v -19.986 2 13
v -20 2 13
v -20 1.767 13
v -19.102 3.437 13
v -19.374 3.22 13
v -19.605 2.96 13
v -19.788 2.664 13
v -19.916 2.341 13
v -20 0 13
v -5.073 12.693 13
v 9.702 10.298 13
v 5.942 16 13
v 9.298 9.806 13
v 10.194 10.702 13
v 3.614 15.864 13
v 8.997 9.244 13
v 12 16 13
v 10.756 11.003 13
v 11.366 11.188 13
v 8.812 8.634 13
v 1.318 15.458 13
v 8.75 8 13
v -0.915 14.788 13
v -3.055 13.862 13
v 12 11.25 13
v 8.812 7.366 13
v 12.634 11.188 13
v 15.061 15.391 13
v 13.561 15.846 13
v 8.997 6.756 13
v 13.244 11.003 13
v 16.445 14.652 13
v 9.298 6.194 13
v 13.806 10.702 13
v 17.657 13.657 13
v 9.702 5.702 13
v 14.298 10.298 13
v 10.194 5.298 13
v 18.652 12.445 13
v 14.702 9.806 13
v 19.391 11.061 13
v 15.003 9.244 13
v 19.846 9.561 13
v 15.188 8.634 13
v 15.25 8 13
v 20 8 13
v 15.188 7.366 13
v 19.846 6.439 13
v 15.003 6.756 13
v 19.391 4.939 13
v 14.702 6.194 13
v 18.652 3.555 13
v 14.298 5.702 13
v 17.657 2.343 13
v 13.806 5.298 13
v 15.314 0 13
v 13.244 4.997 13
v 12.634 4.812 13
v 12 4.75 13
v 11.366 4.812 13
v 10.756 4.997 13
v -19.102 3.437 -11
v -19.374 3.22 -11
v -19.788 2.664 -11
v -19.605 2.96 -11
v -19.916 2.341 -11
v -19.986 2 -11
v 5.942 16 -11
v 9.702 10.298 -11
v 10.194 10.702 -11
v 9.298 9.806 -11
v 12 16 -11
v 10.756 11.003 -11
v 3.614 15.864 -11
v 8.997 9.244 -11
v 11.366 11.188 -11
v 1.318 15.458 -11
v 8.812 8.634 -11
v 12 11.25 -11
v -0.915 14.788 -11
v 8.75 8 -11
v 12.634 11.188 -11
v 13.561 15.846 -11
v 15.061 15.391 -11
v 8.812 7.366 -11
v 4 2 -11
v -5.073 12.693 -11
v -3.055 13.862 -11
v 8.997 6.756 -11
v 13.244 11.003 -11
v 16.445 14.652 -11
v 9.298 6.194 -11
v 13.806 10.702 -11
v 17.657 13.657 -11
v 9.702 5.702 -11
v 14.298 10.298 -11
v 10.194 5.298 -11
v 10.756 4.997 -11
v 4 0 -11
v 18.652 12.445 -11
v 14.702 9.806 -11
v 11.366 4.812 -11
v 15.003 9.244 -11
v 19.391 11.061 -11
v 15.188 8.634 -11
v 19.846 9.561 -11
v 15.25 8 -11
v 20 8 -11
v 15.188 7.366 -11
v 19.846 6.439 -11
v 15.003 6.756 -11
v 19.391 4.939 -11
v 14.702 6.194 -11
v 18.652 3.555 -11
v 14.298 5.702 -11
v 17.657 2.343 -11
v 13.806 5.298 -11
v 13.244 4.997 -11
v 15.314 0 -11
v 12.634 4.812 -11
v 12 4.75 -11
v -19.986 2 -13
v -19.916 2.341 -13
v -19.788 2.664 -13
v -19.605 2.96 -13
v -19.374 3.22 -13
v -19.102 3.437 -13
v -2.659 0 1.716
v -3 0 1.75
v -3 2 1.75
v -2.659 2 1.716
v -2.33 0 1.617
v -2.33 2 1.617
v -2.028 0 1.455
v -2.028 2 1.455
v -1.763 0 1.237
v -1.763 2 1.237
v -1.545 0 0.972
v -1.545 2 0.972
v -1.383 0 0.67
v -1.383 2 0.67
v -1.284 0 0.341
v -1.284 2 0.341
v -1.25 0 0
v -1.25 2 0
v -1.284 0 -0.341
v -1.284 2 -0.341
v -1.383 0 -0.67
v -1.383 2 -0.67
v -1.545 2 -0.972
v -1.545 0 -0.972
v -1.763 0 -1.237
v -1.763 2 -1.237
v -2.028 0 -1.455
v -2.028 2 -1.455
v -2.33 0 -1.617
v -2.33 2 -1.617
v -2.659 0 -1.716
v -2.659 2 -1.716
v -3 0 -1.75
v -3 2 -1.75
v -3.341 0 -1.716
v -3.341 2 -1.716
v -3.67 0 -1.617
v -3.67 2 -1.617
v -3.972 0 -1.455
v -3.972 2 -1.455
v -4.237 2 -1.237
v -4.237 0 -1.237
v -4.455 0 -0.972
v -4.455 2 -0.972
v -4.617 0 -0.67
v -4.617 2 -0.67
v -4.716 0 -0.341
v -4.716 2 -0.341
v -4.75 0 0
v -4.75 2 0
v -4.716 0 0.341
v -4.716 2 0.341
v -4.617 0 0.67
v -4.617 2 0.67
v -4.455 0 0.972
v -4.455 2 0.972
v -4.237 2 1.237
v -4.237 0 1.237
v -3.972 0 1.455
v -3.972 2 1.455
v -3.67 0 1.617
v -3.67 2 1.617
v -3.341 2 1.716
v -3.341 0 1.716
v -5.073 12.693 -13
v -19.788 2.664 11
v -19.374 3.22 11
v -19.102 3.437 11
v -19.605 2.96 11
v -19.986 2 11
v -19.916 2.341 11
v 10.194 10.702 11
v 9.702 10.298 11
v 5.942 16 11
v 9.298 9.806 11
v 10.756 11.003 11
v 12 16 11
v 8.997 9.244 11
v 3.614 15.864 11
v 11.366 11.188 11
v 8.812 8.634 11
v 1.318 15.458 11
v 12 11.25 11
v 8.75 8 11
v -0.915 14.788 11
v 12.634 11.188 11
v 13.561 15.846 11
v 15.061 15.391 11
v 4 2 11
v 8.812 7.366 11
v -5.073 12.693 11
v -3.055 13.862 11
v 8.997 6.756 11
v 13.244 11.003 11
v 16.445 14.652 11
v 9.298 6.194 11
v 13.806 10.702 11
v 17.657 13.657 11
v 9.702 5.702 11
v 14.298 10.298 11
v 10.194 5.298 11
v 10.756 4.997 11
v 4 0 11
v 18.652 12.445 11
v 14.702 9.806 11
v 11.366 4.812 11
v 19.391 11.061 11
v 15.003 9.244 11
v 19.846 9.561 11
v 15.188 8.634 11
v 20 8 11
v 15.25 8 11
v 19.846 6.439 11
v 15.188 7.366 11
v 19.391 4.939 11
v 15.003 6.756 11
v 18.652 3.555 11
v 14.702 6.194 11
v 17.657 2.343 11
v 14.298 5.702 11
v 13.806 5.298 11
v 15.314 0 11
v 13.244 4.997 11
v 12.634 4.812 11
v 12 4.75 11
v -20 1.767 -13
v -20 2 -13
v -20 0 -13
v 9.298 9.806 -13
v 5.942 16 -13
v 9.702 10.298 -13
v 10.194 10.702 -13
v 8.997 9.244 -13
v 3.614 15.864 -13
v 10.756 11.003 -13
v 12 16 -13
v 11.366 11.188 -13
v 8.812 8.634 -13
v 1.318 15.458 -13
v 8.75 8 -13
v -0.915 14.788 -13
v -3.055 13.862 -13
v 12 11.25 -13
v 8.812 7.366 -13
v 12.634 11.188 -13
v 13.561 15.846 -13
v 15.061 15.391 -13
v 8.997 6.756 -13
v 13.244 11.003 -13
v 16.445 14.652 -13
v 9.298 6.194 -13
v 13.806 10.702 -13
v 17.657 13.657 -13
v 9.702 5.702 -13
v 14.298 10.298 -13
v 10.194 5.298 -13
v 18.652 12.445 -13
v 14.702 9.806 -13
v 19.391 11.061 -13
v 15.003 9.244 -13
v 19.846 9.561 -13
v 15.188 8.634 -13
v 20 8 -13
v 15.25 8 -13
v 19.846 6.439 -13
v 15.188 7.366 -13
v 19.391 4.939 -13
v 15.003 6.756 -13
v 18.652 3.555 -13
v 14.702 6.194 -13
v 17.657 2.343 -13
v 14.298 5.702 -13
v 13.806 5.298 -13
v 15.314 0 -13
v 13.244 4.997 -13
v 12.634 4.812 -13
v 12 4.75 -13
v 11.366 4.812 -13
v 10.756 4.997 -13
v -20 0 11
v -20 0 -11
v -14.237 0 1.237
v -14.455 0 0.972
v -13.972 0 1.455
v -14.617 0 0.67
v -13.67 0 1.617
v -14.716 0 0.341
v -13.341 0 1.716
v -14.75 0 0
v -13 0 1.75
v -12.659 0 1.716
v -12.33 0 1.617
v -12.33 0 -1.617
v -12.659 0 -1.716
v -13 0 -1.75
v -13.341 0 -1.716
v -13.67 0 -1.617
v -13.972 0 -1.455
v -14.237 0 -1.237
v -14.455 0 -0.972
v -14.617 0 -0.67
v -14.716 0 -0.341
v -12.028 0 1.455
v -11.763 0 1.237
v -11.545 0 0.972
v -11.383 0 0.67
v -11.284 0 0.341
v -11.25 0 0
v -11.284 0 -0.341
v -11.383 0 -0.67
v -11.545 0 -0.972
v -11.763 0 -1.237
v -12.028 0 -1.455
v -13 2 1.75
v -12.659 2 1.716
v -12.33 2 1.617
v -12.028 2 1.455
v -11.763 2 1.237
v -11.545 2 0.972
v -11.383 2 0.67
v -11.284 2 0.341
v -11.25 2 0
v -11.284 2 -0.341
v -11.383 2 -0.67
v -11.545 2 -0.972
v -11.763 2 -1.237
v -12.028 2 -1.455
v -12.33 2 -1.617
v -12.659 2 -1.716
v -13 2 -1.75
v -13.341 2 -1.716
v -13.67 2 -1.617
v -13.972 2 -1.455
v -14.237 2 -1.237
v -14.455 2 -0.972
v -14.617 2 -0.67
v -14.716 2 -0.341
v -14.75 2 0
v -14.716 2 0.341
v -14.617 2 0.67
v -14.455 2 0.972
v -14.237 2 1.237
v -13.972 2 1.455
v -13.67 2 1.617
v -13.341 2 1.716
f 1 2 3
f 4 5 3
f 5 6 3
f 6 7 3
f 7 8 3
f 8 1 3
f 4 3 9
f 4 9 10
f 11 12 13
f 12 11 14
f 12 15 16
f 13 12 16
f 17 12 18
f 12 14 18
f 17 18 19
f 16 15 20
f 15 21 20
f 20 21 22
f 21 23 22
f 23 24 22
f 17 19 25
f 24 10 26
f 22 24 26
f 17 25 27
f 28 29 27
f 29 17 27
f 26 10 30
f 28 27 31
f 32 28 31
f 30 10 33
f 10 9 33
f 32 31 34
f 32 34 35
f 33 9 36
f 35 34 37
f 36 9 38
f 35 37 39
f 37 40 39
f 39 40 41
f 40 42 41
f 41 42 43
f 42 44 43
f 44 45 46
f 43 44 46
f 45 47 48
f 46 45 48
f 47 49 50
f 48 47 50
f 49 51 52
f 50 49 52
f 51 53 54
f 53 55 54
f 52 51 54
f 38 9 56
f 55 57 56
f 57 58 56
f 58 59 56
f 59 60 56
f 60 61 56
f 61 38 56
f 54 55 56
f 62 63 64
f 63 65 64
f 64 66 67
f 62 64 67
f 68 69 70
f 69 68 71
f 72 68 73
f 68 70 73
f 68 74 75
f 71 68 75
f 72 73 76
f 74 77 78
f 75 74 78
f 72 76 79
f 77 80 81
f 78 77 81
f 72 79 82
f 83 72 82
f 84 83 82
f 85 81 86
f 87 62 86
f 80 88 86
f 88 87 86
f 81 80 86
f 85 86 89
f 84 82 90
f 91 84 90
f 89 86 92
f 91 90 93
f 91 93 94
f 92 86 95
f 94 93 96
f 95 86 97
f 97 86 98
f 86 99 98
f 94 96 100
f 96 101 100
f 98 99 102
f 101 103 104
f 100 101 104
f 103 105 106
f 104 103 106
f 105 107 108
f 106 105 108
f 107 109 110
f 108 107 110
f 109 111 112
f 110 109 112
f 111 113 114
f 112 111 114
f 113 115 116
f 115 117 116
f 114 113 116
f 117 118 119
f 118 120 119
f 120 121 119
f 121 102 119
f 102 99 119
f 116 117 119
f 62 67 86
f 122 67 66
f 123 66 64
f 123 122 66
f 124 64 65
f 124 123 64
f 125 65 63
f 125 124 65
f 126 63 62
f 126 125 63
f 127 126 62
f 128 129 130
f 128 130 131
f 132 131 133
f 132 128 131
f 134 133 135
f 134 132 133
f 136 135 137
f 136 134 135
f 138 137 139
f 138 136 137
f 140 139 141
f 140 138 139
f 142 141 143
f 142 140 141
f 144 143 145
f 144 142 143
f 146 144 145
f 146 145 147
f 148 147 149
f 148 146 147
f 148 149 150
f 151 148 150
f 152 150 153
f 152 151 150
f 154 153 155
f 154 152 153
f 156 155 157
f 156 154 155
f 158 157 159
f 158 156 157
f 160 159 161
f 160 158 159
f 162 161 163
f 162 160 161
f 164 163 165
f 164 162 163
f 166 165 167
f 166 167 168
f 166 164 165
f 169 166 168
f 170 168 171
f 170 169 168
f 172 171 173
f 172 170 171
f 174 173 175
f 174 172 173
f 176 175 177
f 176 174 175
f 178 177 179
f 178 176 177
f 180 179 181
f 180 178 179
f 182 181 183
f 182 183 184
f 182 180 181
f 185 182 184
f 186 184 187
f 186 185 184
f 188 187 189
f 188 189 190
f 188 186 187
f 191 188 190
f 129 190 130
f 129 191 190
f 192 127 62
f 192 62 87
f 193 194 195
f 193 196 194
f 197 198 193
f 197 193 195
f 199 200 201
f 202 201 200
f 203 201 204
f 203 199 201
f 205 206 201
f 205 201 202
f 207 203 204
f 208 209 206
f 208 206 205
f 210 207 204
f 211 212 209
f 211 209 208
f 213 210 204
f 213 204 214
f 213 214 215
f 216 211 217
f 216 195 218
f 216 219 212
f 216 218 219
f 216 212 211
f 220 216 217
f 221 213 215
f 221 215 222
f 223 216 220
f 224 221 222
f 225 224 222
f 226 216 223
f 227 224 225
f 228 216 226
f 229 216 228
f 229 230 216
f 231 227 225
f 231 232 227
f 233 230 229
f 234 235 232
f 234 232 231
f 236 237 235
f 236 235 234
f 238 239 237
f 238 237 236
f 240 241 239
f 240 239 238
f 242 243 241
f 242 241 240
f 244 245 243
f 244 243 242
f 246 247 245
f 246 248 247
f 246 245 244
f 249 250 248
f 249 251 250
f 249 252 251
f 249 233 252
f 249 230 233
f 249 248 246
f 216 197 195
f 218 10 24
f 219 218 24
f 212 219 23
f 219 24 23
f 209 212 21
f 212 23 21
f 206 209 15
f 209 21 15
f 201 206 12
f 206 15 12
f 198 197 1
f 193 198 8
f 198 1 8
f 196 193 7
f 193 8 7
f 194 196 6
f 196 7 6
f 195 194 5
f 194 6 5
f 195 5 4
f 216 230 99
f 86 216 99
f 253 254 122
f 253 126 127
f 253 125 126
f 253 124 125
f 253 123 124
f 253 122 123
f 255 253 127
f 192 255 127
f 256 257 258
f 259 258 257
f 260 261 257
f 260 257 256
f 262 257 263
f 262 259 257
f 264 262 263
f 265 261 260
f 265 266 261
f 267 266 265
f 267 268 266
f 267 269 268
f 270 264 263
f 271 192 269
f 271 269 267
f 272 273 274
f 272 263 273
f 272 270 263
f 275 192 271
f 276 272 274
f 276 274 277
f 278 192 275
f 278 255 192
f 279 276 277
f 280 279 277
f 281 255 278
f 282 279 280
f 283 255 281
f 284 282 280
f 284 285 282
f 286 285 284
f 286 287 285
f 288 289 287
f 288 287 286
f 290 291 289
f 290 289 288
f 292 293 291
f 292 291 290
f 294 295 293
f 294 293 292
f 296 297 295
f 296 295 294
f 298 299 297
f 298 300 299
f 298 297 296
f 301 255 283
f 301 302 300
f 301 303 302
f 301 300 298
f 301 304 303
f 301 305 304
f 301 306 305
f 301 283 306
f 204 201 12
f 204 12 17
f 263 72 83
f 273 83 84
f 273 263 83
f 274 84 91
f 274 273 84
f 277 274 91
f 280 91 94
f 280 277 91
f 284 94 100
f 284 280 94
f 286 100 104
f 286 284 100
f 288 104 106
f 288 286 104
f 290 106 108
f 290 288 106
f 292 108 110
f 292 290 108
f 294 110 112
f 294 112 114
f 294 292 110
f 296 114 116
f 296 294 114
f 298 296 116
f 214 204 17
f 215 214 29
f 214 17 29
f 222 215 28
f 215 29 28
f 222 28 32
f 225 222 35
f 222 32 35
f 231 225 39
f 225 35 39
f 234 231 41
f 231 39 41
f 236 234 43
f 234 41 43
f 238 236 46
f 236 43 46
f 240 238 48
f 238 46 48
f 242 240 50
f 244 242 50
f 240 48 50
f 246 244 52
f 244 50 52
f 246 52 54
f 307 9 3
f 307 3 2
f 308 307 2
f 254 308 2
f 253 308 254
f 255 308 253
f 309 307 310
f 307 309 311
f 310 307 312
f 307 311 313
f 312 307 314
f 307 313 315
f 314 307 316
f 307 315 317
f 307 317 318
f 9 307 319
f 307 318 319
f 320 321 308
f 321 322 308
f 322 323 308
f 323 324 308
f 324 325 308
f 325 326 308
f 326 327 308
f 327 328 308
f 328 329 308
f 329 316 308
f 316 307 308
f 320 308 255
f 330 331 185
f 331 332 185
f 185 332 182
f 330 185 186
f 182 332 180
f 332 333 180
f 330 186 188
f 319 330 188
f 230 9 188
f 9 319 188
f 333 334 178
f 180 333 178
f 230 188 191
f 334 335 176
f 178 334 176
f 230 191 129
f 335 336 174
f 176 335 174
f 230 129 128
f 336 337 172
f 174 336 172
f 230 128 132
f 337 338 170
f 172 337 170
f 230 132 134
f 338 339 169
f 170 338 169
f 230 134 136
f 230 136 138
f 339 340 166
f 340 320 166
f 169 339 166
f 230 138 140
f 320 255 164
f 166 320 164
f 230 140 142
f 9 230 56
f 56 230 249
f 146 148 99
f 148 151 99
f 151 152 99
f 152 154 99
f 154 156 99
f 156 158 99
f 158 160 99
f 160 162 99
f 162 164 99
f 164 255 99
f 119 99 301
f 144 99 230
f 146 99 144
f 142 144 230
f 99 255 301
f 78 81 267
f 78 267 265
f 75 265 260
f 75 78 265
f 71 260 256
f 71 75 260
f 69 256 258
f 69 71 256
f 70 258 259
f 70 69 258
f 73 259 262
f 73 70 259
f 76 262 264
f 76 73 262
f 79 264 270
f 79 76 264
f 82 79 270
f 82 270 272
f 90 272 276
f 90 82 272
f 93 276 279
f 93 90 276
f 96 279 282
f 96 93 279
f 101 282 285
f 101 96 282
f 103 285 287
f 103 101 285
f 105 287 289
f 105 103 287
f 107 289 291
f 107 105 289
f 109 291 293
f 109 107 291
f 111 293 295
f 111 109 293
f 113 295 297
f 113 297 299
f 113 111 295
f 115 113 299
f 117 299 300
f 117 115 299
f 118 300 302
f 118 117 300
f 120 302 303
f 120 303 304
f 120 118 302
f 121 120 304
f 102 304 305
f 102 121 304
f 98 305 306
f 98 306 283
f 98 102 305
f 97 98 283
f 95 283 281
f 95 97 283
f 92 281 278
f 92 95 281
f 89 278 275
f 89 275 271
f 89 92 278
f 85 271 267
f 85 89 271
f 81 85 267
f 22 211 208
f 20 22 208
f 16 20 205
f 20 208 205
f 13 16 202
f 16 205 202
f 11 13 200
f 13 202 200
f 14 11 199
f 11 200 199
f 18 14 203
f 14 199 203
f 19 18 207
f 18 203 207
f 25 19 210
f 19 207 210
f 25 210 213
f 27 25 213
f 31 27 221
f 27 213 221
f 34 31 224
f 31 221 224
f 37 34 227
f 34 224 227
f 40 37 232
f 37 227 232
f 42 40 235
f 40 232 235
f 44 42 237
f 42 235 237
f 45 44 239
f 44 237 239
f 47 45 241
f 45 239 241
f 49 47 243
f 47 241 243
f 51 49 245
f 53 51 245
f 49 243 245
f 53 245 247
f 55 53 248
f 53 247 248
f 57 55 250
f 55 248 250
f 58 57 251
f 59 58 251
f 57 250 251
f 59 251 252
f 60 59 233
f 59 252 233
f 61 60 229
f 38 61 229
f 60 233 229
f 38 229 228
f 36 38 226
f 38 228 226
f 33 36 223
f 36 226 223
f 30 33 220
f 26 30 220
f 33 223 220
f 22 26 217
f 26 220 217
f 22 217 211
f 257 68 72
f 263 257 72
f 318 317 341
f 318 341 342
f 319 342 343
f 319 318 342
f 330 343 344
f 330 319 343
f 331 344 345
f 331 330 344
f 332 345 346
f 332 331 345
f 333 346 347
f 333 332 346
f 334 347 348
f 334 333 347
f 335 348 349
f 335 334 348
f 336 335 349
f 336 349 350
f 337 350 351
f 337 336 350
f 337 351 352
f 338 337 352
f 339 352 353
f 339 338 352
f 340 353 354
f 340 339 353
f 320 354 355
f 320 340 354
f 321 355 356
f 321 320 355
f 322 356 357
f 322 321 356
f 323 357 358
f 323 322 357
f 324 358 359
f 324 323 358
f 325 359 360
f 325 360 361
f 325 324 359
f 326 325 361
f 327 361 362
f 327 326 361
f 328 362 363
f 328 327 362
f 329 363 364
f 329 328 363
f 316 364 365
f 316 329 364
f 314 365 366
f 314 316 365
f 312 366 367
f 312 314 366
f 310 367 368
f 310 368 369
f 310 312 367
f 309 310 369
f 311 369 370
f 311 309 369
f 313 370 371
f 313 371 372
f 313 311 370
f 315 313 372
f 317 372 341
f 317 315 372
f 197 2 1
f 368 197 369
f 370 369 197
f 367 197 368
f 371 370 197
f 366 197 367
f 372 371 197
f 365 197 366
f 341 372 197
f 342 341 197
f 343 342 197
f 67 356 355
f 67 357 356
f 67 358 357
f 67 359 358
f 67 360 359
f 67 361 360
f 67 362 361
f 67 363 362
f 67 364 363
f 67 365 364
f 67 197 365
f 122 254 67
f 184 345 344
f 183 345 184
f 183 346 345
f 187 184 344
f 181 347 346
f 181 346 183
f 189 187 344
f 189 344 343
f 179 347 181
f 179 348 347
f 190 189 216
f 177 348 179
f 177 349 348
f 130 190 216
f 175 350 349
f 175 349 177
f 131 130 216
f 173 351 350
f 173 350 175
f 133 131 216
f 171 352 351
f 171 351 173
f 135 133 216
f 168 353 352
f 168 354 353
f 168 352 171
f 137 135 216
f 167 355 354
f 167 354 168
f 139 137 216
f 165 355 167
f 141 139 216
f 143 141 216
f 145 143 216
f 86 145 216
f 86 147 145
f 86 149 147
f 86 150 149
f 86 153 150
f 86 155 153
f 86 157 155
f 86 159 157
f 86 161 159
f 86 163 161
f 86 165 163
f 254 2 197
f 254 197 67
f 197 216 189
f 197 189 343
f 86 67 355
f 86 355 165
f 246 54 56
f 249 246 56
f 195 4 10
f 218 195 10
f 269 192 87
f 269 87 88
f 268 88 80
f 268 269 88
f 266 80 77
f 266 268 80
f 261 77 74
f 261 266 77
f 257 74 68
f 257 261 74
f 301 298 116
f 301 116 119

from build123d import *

# Parameters (mm, degrees)
SKETCH6_W               = 40
SKETCH6_H               = 2
BOSS_EXTRUDE4_DEPTH     = 16
SKETCH9_R               = 3.25
CUT_EXTRUDE2_DEPTH      = 2
CUT_EXTRUDE1_DEPTH      = 26.690465157
CUT_EXTRUDE1_DEPTH_BACK = 16
SKETCH7_W               = 42.708590122
SKETCH7_H               = 18.182038554
SKETCH12_W              = 23.999933515
SKETCH12_H              = 26
SKETCH12_R              = 1.75
BOSS_EXTRUDE8_DEPTH     = 2


with BuildPart() as part:
    # Sketch6 → Boss-Extrude4 (new body)
    with BuildSketch(Plane(origin=(0, 0, 0), x_dir=(1, 0, 0), z_dir=(0, 1, 0))):
        with Locations((0, -12)):
            Rectangle(SKETCH6_W, SKETCH6_H)
    extrude(amount=BOSS_EXTRUDE4_DEPTH)

    # Sketch9 → Cut-Extrude2 (cut)
    with BuildSketch(Plane(origin=(0, 0, 11), x_dir=(-1, 0, 0), z_dir=(0, 0, -1))):
        with Locations((-12, 8)):
            Circle(SKETCH9_R)
    extrude(amount=-CUT_EXTRUDE2_DEPTH, mode=Mode.SUBTRACT)

    # Sketch7 → Cut-Extrude1 (cut, two sides: drawn at the far end of the back side and taken through both)
    with BuildSketch(Plane(origin=(0, 0, 11), x_dir=(-1, 0, 0), z_dir=(0, 0, -1)).offset(-CUT_EXTRUDE1_DEPTH_BACK)):
        with Locations((0, 8)):
            Rectangle(SKETCH7_W, SKETCH7_H)
        with BuildLine():
            Line((-5.942038411, 16), (-12, 16))
            ThreePointArc((-12, 16), (-19.39103626, 11.061467459), (-17.656854249, 2.343145751))
            Line((-17.656854249, 2.343145751), (-15.313708499, 0))
            Line((-15.313708499, 0), (20, 0))
            Line((20, 0), (20, 1.767244224))
            ThreePointArc((20, 1.767244224), (19.761112544, 2.715127447), (19.101517394, 3.43657326))
            Line((19.101517394, 3.43657326), (5.07313553, 12.69329036))
            ThreePointArc((5.07313553, 12.69329036), (-0.191638738, 15.155492779), (-5.942038411, 16))
        make_face(mode=Mode.SUBTRACT)
    extrude(amount=CUT_EXTRUDE1_DEPTH + CUT_EXTRUDE1_DEPTH_BACK, mode=Mode.SUBTRACT)


with BuildPart() as body_2:
    # Mirror2: mirrored copy
    add(part.part.mirror(Plane.XY))


with BuildPart() as part_1:
    add(part.part)

    add(body_2.part)  # Boss-Extrude8 merges body 2
    # Sketch12 → Boss-Extrude8 (add)
    with BuildSketch(Plane(origin=(0, 0, 0), x_dir=(1, 0, 0), z_dir=(0, 1, 0))):
        with Locations((-8.000033242, 0)):
            Rectangle(SKETCH12_W, SKETCH12_H)
        with Locations(Location((-13.000047854, 0, 0), (0, 0, 270))):
            Circle(SKETCH12_R, mode=Mode.SUBTRACT)
        with Locations(Location((-3.000047854, 0, 0), (0, 0, 270))):
            Circle(SKETCH12_R, mode=Mode.SUBTRACT)
    extrude(amount=BOSS_EXTRUDE8_DEPTH)


solid = part_1.part
